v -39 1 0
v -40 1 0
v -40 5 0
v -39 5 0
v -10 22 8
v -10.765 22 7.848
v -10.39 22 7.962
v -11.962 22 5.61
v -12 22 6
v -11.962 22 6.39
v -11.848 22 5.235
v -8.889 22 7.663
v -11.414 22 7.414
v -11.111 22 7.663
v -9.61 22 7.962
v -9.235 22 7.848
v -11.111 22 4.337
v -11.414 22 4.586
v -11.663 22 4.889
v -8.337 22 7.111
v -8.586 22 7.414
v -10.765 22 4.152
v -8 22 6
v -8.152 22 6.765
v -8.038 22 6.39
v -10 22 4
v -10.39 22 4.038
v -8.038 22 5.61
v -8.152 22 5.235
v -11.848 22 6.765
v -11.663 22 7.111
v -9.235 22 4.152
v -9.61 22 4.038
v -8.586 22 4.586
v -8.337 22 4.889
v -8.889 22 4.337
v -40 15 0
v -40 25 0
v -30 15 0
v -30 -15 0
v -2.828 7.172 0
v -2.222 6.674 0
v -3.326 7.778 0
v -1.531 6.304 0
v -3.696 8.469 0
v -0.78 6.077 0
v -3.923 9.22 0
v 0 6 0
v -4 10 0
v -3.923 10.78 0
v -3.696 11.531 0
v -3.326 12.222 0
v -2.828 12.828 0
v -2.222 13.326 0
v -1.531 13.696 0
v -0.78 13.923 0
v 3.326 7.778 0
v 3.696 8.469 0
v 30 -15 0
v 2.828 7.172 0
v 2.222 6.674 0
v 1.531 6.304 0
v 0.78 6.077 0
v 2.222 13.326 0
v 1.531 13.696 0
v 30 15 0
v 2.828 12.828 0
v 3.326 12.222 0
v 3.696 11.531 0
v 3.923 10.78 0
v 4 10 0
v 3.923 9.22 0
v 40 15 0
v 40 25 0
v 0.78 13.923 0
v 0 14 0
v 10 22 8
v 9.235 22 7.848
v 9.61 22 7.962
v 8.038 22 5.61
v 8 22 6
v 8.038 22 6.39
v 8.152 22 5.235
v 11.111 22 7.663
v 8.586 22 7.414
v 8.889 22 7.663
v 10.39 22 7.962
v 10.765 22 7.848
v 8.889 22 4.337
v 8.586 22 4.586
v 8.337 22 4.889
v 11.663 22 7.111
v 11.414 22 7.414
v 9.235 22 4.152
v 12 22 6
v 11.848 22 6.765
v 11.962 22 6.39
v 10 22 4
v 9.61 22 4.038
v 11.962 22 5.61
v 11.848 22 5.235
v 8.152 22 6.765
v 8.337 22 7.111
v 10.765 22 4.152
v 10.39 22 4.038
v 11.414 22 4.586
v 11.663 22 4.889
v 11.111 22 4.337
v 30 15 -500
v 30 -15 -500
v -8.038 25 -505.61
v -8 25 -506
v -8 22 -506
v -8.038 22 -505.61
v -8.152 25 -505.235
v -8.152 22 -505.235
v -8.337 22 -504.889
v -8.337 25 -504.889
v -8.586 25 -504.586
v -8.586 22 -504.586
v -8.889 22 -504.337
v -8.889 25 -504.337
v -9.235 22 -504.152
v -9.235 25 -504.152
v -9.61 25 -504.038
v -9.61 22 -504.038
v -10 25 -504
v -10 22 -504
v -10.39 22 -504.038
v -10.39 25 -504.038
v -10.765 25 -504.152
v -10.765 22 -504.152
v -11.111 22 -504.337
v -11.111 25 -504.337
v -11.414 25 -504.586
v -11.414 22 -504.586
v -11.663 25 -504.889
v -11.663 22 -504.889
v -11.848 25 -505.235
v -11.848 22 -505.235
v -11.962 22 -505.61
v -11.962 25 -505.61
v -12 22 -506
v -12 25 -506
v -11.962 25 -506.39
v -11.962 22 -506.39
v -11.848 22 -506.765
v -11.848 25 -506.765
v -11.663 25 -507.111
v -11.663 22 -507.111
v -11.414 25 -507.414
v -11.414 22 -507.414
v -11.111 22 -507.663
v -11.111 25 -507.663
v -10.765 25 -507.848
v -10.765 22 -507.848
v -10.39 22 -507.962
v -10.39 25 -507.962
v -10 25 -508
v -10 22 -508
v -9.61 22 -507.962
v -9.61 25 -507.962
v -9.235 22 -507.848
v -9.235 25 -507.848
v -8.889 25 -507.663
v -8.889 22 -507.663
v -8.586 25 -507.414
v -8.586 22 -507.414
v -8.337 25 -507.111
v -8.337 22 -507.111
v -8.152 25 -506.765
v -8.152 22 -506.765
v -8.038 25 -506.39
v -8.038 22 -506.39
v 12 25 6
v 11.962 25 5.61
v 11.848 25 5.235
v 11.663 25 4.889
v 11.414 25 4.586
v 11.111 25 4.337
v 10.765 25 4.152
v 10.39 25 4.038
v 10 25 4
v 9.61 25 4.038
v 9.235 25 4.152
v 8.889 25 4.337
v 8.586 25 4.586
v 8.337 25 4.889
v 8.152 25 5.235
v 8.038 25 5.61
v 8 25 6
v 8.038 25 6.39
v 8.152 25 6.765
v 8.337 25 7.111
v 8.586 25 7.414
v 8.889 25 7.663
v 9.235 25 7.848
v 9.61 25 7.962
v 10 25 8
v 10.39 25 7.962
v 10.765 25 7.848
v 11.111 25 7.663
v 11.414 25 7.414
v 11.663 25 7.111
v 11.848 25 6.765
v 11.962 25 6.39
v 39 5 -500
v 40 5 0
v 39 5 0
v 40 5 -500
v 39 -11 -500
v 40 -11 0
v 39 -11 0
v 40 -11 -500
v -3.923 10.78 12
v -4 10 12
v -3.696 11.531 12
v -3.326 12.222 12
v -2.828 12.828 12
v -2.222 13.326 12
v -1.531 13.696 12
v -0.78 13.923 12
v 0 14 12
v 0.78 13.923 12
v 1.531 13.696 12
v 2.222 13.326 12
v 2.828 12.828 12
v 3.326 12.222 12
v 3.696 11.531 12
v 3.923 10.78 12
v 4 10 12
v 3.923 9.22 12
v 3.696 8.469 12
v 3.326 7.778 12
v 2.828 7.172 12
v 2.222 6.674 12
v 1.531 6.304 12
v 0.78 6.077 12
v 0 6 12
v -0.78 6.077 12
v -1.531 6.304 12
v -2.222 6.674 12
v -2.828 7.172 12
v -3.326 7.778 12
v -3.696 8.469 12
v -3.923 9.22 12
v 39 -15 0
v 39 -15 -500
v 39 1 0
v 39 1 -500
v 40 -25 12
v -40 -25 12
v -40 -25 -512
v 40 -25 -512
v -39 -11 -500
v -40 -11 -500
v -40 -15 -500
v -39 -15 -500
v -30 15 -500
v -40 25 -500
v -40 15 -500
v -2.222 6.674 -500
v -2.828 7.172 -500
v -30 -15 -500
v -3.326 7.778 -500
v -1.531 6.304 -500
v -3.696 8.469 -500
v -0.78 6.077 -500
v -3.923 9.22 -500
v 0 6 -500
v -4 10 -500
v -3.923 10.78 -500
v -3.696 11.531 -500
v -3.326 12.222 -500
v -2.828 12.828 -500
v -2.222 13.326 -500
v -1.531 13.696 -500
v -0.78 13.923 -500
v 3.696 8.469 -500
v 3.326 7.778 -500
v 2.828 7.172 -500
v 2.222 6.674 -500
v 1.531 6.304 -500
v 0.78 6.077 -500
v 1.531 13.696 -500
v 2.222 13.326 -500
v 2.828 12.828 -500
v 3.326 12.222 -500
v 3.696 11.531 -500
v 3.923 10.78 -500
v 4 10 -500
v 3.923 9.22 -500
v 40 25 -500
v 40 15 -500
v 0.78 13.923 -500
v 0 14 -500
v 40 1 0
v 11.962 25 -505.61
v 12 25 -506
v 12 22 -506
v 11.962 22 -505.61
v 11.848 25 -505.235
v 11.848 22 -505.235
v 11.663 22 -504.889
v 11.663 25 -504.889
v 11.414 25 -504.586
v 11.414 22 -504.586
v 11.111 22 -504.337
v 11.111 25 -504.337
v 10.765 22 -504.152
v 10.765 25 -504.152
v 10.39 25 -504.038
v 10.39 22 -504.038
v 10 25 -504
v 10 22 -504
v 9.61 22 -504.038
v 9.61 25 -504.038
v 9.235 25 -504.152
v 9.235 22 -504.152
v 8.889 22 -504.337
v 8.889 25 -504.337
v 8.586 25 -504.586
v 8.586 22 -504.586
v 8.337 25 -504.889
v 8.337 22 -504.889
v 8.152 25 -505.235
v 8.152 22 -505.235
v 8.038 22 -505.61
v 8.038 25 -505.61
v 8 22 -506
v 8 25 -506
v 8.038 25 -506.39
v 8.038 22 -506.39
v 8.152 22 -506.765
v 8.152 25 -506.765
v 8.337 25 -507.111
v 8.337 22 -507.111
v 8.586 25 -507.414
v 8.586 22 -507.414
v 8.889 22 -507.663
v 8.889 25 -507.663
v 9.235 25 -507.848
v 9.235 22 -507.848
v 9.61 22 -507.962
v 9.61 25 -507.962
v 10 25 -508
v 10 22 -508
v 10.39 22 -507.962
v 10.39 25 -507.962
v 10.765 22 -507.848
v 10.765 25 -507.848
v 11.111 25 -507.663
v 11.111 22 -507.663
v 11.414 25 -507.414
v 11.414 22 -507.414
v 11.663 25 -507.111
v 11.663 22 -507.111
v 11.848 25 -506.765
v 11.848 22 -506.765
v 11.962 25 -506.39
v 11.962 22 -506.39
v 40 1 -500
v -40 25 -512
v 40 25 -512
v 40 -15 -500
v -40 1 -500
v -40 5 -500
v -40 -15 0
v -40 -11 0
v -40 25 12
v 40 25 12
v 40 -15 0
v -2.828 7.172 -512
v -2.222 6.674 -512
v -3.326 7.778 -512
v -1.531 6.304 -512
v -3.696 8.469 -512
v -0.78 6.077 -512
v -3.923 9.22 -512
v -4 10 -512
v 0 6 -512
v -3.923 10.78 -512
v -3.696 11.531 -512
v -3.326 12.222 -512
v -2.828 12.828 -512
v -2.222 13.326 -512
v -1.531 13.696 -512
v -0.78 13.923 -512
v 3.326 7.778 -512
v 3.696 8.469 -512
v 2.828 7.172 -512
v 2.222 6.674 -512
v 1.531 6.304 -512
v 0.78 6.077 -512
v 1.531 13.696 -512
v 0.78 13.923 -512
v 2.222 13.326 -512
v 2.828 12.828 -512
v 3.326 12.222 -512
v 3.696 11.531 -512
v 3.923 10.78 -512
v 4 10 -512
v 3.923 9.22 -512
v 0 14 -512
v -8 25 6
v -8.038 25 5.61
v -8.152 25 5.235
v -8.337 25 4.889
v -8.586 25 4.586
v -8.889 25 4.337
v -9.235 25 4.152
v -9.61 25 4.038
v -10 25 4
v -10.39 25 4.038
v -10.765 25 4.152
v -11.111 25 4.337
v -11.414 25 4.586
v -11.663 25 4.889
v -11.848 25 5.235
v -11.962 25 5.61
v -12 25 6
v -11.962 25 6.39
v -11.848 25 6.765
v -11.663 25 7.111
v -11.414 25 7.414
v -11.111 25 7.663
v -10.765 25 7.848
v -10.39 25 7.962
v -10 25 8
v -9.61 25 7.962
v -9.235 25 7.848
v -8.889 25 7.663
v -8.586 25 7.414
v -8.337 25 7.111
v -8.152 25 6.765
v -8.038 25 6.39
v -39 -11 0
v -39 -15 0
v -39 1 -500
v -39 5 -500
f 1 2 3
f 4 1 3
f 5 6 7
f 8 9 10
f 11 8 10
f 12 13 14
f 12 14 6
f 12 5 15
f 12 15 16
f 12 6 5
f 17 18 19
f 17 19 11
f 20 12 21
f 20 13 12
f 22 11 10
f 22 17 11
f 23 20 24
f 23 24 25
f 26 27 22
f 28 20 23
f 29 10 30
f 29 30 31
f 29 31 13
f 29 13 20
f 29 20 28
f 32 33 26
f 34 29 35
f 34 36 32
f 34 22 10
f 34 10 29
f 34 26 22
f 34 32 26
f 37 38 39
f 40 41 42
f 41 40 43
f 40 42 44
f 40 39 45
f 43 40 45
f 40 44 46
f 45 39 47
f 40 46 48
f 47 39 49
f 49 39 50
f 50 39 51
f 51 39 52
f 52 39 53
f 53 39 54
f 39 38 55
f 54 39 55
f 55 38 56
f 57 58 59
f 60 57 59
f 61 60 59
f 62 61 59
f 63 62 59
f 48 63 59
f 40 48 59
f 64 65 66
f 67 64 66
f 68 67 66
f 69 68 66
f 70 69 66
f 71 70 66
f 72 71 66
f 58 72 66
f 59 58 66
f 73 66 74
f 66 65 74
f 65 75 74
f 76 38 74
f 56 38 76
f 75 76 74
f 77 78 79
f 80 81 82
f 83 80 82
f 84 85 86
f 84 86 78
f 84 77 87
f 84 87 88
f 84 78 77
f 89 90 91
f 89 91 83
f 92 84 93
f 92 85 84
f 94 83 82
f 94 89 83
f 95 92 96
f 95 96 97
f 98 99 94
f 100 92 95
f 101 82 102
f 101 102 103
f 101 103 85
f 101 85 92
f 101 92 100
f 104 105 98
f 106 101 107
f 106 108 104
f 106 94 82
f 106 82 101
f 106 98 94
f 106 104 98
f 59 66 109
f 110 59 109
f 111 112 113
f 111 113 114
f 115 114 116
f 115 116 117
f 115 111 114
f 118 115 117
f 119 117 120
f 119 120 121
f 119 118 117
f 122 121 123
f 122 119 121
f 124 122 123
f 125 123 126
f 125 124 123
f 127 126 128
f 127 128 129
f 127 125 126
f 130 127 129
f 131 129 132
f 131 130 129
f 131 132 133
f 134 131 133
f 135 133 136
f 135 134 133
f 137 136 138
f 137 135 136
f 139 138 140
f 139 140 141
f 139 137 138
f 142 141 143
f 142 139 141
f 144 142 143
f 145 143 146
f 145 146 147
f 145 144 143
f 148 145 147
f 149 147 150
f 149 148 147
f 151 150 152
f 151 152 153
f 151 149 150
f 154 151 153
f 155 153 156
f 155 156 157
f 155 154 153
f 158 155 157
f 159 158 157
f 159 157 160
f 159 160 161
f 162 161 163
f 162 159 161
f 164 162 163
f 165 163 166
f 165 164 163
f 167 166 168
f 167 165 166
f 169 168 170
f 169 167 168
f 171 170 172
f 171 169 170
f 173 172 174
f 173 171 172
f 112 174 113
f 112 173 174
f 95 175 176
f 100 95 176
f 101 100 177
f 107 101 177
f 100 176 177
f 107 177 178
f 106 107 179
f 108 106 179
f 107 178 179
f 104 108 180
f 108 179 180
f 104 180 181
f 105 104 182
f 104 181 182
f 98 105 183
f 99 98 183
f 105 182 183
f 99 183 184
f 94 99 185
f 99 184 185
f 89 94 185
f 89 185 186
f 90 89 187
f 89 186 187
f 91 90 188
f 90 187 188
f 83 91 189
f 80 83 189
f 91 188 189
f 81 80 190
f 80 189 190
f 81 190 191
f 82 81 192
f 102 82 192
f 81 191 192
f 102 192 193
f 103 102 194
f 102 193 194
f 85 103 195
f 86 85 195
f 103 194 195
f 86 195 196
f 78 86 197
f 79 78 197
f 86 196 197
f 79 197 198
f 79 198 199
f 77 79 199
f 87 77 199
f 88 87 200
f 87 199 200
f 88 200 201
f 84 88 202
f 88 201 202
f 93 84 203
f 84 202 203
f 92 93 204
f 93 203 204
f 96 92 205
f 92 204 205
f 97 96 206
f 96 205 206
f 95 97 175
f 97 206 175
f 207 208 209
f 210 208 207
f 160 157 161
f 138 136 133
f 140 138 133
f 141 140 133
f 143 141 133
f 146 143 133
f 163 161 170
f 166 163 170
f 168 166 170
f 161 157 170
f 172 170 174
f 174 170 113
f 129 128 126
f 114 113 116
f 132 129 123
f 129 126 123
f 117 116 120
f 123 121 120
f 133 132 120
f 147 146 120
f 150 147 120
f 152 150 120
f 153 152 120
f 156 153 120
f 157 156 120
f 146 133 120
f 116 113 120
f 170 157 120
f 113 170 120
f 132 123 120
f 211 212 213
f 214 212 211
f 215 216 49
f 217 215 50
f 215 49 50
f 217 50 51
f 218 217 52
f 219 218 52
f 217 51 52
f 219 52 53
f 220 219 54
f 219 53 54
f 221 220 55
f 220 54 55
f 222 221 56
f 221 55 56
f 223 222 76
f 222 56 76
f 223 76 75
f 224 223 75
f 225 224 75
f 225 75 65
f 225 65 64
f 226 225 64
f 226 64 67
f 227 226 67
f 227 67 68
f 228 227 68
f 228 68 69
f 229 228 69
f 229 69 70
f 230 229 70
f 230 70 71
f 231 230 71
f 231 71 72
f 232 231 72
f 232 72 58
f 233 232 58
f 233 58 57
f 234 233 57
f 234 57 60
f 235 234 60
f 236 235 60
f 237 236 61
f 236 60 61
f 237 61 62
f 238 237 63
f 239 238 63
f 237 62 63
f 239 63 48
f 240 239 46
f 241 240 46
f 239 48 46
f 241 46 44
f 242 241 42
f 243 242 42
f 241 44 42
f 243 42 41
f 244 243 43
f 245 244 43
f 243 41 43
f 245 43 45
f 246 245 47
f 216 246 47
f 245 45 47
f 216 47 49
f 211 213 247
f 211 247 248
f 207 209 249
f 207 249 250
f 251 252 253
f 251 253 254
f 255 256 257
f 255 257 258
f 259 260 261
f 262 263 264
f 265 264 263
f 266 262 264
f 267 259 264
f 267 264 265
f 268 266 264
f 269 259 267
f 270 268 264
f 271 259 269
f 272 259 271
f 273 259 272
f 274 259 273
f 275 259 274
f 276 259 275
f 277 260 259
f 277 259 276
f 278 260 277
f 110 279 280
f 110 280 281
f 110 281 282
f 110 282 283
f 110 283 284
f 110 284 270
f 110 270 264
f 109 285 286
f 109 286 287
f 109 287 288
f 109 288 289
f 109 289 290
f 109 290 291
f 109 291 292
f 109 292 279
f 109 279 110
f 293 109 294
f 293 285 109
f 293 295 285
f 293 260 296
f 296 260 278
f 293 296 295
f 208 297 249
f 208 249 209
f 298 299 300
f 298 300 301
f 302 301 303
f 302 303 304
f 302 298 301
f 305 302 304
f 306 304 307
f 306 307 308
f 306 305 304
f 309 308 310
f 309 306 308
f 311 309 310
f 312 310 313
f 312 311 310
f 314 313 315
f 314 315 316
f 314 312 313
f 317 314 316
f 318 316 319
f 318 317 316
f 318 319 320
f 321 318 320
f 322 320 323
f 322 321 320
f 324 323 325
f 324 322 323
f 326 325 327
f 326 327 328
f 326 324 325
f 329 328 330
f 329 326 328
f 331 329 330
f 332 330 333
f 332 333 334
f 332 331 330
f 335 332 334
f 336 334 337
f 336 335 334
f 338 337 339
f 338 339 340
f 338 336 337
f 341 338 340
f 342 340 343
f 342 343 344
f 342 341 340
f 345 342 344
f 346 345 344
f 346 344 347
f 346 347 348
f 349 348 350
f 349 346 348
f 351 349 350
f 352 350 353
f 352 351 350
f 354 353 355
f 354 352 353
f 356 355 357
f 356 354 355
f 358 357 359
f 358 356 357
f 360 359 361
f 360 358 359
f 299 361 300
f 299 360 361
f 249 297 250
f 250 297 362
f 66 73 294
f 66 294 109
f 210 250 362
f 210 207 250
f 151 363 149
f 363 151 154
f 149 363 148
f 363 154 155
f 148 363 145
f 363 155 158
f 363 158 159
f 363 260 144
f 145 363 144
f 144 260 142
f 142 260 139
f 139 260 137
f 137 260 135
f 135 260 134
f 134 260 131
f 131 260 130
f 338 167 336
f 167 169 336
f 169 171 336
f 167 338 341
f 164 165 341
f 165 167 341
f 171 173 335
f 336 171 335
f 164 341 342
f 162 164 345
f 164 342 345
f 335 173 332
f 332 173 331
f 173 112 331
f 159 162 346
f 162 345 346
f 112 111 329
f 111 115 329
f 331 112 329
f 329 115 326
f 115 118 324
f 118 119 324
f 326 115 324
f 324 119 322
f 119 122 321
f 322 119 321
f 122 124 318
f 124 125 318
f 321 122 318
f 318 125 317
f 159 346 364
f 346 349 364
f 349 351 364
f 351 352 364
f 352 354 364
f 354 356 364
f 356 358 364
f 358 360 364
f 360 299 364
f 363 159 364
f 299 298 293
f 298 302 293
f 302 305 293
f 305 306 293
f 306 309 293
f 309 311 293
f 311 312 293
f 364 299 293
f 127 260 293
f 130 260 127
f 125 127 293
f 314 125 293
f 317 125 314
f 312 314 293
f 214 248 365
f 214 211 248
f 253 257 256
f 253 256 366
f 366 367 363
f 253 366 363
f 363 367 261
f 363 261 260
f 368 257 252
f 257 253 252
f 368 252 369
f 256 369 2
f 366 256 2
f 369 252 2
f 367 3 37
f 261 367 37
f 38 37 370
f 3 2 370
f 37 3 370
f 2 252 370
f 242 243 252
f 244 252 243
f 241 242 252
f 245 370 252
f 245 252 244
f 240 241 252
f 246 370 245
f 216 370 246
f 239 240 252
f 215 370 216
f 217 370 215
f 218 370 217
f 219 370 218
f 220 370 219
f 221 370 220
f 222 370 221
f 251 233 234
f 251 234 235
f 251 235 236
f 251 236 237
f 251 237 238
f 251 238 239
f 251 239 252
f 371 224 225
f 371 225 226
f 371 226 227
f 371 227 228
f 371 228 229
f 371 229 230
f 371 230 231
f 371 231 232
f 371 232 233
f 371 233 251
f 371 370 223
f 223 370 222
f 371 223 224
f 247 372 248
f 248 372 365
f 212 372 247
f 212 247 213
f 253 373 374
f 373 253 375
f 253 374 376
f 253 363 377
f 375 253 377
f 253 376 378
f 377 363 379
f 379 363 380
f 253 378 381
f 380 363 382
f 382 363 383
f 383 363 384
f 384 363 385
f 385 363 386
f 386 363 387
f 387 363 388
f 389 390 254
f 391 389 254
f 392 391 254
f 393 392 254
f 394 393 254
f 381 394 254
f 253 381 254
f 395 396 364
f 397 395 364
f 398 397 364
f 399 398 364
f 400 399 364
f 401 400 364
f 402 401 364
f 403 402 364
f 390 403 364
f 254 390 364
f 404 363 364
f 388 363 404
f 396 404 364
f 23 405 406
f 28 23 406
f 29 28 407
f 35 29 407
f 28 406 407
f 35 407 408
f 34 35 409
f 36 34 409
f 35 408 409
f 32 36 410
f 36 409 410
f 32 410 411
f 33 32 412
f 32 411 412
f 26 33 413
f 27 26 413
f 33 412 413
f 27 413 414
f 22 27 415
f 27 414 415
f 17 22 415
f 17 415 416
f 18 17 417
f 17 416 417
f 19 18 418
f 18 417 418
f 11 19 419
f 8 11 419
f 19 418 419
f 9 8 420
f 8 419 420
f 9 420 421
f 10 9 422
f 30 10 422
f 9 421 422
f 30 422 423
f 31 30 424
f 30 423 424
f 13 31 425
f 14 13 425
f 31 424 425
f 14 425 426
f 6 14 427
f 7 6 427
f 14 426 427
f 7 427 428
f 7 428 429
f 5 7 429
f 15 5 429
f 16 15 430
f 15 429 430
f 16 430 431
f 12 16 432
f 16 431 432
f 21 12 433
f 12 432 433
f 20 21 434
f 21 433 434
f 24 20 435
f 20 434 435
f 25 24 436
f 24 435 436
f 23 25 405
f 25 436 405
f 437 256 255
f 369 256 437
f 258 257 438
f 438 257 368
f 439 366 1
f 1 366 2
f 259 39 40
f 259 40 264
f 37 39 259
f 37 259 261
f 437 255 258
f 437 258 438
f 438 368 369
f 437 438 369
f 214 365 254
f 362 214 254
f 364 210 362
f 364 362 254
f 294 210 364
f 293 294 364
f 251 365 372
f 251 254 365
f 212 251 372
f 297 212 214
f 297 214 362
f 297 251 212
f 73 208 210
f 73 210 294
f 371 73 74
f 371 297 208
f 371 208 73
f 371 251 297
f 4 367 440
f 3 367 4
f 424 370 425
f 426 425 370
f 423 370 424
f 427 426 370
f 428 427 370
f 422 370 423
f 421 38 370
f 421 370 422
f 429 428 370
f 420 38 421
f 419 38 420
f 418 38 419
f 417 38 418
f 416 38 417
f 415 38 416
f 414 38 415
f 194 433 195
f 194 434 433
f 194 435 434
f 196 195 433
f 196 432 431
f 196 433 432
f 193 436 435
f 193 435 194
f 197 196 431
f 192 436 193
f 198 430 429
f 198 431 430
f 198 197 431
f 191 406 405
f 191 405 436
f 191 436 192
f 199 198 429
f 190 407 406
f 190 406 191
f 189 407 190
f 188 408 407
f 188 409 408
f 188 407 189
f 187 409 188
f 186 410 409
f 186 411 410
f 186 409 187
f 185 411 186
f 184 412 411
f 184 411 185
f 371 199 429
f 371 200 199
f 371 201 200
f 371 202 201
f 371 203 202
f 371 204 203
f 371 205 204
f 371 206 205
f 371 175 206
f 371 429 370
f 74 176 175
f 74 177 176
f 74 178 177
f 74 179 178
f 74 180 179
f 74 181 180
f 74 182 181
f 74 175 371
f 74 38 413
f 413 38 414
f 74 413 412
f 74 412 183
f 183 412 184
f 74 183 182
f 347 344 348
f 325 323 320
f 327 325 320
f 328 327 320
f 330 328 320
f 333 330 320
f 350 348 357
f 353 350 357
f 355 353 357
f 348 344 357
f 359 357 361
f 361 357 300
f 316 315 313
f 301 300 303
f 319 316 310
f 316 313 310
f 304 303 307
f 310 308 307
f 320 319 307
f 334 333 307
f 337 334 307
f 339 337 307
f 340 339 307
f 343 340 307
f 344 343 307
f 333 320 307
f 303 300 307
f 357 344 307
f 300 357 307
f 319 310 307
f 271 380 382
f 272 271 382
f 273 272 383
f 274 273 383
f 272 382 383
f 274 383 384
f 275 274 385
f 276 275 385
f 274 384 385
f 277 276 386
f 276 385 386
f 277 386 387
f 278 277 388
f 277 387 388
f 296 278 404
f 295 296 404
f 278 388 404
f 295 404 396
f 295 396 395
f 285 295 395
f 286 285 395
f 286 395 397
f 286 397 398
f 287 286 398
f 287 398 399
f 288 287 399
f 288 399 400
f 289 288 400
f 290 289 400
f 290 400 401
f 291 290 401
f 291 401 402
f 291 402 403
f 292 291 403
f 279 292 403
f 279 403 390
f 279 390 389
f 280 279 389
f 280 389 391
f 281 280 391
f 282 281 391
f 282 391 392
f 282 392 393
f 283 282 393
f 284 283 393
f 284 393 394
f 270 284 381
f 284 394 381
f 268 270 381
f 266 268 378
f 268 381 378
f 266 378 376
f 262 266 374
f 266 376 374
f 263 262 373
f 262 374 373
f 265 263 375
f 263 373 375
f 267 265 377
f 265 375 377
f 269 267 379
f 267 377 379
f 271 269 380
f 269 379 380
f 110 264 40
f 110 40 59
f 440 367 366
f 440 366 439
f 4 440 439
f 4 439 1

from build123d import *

# Parameters (mm, degrees)
CROQUIS1_W              = 80
CROQUIS1_H              = 50
SALIENTE_EXTRUIR1_DEPTH = 12
CROQUIS2_R              = 2
CORTAR_EXTRUIR1_DEPTH   = 3
CROQUIS3_W              = 80
CROQUIS3_H              = 40
SALIENTE_EXTRUIR2_DEPTH = 500
CROQUIS4_W              = 60
CROQUIS4_H              = 500
CORTAR_EXTRUIR2_DEPTH   = 30
CROQUIS5_W              = 500
CROQUIS5_H              = 4
CORTAR_EXTRUIR3_DEPTH   = 1
CROQUIS6_W              = 500
CROQUIS6_H              = 4
CORTAR_EXTRUIR4_DEPTH   = 1
CROQUIS7_R              = 4
CORTAR_EXTRUIR5_DEPTH   = 621


with BuildPart() as part:
    # Croquis1 → Saliente-Extruir1 (new body)
    with BuildSketch(Plane.XY):
        Rectangle(CROQUIS1_W, CROQUIS1_H)
    saliente_extruir1 = extrude(amount=SALIENTE_EXTRUIR1_DEPTH)

    # Croquis2 → Cortar-Extruir1 (cut)
    with BuildSketch(Plane(origin=(0, 25, 0), x_dir=(1, 0, 0), z_dir=(0, 1, 0))):
        with Locations((-10, -6)):
            Circle(CROQUIS2_R)
        with Locations((10, -6)):
            Circle(CROQUIS2_R)
    cortar_extruir1 = extrude(amount=-CORTAR_EXTRUIR1_DEPTH, mode=Mode.SUBTRACT)

    # Croquis3 → Saliente-Extruir2 (add)
    with BuildSketch(Plane(origin=(0, 0, 0), x_dir=(-1, 0, 0), z_dir=(0, 0, -1))):
        with Locations((0, -5)):
            Rectangle(CROQUIS3_W, CROQUIS3_H)
    extrude(amount=SALIENTE_EXTRUIR2_DEPTH)

    # Croquis4 → Cortar-Extruir2 (cut)
    with BuildSketch(Plane(origin=(0, 15, 0), x_dir=(1, 0, 0), z_dir=(0, 1, 0))):
        with Locations((0, 250)):
            Rectangle(CROQUIS4_W, CROQUIS4_H)
    extrude(amount=-CORTAR_EXTRUIR2_DEPTH, mode=Mode.SUBTRACT)

    # Croquis5 → Cortar-Extruir3 (cut)
    with BuildSketch(Plane.ZY.offset(40)):
        with Locations((-250, 3)):
            Rectangle(CROQUIS5_W, CROQUIS5_H)
        with Locations((-250, -13)):
            Rectangle(CROQUIS5_W, CROQUIS5_H)
    extrude(amount=-CORTAR_EXTRUIR3_DEPTH, mode=Mode.SUBTRACT)

    # Croquis6 → Cortar-Extruir4 (cut)
    with BuildSketch(Plane(origin=(40, 0, 0), x_dir=(0, 0, -1), z_dir=(1, 0, 0))):
        with Locations((250, 3)):
            Rectangle(CROQUIS6_W, CROQUIS6_H)
        with Locations((250, -13)):
            Rectangle(CROQUIS6_W, CROQUIS6_H)
    extrude(amount=-CORTAR_EXTRUIR4_DEPTH, mode=Mode.SUBTRACT)

    # Simetría1: Saliente-Extruir1, Cortar-Extruir1 across plane
    add(saliente_extruir1.mirror(Plane(origin=(0, 0, -250), x_dir=(1, 0, 0), z_dir=(0, 0, -1))))
    add(cortar_extruir1.mirror(Plane(origin=(0, 0, -250), x_dir=(1, 0, 0), z_dir=(0, 0, -1))), mode=Mode.SUBTRACT)

    # Croquis7 → Cortar-Extruir5 (cut)
    with BuildSketch(Plane(origin=(0, 0, -512), x_dir=(-1, 0, 0), z_dir=(0, 0, -1))):
        with Locations((0, 10)):
            Circle(CROQUIS7_R)
    extrude(amount=-CORTAR_EXTRUIR5_DEPTH, mode=Mode.SUBTRACT)


solid = part.part
